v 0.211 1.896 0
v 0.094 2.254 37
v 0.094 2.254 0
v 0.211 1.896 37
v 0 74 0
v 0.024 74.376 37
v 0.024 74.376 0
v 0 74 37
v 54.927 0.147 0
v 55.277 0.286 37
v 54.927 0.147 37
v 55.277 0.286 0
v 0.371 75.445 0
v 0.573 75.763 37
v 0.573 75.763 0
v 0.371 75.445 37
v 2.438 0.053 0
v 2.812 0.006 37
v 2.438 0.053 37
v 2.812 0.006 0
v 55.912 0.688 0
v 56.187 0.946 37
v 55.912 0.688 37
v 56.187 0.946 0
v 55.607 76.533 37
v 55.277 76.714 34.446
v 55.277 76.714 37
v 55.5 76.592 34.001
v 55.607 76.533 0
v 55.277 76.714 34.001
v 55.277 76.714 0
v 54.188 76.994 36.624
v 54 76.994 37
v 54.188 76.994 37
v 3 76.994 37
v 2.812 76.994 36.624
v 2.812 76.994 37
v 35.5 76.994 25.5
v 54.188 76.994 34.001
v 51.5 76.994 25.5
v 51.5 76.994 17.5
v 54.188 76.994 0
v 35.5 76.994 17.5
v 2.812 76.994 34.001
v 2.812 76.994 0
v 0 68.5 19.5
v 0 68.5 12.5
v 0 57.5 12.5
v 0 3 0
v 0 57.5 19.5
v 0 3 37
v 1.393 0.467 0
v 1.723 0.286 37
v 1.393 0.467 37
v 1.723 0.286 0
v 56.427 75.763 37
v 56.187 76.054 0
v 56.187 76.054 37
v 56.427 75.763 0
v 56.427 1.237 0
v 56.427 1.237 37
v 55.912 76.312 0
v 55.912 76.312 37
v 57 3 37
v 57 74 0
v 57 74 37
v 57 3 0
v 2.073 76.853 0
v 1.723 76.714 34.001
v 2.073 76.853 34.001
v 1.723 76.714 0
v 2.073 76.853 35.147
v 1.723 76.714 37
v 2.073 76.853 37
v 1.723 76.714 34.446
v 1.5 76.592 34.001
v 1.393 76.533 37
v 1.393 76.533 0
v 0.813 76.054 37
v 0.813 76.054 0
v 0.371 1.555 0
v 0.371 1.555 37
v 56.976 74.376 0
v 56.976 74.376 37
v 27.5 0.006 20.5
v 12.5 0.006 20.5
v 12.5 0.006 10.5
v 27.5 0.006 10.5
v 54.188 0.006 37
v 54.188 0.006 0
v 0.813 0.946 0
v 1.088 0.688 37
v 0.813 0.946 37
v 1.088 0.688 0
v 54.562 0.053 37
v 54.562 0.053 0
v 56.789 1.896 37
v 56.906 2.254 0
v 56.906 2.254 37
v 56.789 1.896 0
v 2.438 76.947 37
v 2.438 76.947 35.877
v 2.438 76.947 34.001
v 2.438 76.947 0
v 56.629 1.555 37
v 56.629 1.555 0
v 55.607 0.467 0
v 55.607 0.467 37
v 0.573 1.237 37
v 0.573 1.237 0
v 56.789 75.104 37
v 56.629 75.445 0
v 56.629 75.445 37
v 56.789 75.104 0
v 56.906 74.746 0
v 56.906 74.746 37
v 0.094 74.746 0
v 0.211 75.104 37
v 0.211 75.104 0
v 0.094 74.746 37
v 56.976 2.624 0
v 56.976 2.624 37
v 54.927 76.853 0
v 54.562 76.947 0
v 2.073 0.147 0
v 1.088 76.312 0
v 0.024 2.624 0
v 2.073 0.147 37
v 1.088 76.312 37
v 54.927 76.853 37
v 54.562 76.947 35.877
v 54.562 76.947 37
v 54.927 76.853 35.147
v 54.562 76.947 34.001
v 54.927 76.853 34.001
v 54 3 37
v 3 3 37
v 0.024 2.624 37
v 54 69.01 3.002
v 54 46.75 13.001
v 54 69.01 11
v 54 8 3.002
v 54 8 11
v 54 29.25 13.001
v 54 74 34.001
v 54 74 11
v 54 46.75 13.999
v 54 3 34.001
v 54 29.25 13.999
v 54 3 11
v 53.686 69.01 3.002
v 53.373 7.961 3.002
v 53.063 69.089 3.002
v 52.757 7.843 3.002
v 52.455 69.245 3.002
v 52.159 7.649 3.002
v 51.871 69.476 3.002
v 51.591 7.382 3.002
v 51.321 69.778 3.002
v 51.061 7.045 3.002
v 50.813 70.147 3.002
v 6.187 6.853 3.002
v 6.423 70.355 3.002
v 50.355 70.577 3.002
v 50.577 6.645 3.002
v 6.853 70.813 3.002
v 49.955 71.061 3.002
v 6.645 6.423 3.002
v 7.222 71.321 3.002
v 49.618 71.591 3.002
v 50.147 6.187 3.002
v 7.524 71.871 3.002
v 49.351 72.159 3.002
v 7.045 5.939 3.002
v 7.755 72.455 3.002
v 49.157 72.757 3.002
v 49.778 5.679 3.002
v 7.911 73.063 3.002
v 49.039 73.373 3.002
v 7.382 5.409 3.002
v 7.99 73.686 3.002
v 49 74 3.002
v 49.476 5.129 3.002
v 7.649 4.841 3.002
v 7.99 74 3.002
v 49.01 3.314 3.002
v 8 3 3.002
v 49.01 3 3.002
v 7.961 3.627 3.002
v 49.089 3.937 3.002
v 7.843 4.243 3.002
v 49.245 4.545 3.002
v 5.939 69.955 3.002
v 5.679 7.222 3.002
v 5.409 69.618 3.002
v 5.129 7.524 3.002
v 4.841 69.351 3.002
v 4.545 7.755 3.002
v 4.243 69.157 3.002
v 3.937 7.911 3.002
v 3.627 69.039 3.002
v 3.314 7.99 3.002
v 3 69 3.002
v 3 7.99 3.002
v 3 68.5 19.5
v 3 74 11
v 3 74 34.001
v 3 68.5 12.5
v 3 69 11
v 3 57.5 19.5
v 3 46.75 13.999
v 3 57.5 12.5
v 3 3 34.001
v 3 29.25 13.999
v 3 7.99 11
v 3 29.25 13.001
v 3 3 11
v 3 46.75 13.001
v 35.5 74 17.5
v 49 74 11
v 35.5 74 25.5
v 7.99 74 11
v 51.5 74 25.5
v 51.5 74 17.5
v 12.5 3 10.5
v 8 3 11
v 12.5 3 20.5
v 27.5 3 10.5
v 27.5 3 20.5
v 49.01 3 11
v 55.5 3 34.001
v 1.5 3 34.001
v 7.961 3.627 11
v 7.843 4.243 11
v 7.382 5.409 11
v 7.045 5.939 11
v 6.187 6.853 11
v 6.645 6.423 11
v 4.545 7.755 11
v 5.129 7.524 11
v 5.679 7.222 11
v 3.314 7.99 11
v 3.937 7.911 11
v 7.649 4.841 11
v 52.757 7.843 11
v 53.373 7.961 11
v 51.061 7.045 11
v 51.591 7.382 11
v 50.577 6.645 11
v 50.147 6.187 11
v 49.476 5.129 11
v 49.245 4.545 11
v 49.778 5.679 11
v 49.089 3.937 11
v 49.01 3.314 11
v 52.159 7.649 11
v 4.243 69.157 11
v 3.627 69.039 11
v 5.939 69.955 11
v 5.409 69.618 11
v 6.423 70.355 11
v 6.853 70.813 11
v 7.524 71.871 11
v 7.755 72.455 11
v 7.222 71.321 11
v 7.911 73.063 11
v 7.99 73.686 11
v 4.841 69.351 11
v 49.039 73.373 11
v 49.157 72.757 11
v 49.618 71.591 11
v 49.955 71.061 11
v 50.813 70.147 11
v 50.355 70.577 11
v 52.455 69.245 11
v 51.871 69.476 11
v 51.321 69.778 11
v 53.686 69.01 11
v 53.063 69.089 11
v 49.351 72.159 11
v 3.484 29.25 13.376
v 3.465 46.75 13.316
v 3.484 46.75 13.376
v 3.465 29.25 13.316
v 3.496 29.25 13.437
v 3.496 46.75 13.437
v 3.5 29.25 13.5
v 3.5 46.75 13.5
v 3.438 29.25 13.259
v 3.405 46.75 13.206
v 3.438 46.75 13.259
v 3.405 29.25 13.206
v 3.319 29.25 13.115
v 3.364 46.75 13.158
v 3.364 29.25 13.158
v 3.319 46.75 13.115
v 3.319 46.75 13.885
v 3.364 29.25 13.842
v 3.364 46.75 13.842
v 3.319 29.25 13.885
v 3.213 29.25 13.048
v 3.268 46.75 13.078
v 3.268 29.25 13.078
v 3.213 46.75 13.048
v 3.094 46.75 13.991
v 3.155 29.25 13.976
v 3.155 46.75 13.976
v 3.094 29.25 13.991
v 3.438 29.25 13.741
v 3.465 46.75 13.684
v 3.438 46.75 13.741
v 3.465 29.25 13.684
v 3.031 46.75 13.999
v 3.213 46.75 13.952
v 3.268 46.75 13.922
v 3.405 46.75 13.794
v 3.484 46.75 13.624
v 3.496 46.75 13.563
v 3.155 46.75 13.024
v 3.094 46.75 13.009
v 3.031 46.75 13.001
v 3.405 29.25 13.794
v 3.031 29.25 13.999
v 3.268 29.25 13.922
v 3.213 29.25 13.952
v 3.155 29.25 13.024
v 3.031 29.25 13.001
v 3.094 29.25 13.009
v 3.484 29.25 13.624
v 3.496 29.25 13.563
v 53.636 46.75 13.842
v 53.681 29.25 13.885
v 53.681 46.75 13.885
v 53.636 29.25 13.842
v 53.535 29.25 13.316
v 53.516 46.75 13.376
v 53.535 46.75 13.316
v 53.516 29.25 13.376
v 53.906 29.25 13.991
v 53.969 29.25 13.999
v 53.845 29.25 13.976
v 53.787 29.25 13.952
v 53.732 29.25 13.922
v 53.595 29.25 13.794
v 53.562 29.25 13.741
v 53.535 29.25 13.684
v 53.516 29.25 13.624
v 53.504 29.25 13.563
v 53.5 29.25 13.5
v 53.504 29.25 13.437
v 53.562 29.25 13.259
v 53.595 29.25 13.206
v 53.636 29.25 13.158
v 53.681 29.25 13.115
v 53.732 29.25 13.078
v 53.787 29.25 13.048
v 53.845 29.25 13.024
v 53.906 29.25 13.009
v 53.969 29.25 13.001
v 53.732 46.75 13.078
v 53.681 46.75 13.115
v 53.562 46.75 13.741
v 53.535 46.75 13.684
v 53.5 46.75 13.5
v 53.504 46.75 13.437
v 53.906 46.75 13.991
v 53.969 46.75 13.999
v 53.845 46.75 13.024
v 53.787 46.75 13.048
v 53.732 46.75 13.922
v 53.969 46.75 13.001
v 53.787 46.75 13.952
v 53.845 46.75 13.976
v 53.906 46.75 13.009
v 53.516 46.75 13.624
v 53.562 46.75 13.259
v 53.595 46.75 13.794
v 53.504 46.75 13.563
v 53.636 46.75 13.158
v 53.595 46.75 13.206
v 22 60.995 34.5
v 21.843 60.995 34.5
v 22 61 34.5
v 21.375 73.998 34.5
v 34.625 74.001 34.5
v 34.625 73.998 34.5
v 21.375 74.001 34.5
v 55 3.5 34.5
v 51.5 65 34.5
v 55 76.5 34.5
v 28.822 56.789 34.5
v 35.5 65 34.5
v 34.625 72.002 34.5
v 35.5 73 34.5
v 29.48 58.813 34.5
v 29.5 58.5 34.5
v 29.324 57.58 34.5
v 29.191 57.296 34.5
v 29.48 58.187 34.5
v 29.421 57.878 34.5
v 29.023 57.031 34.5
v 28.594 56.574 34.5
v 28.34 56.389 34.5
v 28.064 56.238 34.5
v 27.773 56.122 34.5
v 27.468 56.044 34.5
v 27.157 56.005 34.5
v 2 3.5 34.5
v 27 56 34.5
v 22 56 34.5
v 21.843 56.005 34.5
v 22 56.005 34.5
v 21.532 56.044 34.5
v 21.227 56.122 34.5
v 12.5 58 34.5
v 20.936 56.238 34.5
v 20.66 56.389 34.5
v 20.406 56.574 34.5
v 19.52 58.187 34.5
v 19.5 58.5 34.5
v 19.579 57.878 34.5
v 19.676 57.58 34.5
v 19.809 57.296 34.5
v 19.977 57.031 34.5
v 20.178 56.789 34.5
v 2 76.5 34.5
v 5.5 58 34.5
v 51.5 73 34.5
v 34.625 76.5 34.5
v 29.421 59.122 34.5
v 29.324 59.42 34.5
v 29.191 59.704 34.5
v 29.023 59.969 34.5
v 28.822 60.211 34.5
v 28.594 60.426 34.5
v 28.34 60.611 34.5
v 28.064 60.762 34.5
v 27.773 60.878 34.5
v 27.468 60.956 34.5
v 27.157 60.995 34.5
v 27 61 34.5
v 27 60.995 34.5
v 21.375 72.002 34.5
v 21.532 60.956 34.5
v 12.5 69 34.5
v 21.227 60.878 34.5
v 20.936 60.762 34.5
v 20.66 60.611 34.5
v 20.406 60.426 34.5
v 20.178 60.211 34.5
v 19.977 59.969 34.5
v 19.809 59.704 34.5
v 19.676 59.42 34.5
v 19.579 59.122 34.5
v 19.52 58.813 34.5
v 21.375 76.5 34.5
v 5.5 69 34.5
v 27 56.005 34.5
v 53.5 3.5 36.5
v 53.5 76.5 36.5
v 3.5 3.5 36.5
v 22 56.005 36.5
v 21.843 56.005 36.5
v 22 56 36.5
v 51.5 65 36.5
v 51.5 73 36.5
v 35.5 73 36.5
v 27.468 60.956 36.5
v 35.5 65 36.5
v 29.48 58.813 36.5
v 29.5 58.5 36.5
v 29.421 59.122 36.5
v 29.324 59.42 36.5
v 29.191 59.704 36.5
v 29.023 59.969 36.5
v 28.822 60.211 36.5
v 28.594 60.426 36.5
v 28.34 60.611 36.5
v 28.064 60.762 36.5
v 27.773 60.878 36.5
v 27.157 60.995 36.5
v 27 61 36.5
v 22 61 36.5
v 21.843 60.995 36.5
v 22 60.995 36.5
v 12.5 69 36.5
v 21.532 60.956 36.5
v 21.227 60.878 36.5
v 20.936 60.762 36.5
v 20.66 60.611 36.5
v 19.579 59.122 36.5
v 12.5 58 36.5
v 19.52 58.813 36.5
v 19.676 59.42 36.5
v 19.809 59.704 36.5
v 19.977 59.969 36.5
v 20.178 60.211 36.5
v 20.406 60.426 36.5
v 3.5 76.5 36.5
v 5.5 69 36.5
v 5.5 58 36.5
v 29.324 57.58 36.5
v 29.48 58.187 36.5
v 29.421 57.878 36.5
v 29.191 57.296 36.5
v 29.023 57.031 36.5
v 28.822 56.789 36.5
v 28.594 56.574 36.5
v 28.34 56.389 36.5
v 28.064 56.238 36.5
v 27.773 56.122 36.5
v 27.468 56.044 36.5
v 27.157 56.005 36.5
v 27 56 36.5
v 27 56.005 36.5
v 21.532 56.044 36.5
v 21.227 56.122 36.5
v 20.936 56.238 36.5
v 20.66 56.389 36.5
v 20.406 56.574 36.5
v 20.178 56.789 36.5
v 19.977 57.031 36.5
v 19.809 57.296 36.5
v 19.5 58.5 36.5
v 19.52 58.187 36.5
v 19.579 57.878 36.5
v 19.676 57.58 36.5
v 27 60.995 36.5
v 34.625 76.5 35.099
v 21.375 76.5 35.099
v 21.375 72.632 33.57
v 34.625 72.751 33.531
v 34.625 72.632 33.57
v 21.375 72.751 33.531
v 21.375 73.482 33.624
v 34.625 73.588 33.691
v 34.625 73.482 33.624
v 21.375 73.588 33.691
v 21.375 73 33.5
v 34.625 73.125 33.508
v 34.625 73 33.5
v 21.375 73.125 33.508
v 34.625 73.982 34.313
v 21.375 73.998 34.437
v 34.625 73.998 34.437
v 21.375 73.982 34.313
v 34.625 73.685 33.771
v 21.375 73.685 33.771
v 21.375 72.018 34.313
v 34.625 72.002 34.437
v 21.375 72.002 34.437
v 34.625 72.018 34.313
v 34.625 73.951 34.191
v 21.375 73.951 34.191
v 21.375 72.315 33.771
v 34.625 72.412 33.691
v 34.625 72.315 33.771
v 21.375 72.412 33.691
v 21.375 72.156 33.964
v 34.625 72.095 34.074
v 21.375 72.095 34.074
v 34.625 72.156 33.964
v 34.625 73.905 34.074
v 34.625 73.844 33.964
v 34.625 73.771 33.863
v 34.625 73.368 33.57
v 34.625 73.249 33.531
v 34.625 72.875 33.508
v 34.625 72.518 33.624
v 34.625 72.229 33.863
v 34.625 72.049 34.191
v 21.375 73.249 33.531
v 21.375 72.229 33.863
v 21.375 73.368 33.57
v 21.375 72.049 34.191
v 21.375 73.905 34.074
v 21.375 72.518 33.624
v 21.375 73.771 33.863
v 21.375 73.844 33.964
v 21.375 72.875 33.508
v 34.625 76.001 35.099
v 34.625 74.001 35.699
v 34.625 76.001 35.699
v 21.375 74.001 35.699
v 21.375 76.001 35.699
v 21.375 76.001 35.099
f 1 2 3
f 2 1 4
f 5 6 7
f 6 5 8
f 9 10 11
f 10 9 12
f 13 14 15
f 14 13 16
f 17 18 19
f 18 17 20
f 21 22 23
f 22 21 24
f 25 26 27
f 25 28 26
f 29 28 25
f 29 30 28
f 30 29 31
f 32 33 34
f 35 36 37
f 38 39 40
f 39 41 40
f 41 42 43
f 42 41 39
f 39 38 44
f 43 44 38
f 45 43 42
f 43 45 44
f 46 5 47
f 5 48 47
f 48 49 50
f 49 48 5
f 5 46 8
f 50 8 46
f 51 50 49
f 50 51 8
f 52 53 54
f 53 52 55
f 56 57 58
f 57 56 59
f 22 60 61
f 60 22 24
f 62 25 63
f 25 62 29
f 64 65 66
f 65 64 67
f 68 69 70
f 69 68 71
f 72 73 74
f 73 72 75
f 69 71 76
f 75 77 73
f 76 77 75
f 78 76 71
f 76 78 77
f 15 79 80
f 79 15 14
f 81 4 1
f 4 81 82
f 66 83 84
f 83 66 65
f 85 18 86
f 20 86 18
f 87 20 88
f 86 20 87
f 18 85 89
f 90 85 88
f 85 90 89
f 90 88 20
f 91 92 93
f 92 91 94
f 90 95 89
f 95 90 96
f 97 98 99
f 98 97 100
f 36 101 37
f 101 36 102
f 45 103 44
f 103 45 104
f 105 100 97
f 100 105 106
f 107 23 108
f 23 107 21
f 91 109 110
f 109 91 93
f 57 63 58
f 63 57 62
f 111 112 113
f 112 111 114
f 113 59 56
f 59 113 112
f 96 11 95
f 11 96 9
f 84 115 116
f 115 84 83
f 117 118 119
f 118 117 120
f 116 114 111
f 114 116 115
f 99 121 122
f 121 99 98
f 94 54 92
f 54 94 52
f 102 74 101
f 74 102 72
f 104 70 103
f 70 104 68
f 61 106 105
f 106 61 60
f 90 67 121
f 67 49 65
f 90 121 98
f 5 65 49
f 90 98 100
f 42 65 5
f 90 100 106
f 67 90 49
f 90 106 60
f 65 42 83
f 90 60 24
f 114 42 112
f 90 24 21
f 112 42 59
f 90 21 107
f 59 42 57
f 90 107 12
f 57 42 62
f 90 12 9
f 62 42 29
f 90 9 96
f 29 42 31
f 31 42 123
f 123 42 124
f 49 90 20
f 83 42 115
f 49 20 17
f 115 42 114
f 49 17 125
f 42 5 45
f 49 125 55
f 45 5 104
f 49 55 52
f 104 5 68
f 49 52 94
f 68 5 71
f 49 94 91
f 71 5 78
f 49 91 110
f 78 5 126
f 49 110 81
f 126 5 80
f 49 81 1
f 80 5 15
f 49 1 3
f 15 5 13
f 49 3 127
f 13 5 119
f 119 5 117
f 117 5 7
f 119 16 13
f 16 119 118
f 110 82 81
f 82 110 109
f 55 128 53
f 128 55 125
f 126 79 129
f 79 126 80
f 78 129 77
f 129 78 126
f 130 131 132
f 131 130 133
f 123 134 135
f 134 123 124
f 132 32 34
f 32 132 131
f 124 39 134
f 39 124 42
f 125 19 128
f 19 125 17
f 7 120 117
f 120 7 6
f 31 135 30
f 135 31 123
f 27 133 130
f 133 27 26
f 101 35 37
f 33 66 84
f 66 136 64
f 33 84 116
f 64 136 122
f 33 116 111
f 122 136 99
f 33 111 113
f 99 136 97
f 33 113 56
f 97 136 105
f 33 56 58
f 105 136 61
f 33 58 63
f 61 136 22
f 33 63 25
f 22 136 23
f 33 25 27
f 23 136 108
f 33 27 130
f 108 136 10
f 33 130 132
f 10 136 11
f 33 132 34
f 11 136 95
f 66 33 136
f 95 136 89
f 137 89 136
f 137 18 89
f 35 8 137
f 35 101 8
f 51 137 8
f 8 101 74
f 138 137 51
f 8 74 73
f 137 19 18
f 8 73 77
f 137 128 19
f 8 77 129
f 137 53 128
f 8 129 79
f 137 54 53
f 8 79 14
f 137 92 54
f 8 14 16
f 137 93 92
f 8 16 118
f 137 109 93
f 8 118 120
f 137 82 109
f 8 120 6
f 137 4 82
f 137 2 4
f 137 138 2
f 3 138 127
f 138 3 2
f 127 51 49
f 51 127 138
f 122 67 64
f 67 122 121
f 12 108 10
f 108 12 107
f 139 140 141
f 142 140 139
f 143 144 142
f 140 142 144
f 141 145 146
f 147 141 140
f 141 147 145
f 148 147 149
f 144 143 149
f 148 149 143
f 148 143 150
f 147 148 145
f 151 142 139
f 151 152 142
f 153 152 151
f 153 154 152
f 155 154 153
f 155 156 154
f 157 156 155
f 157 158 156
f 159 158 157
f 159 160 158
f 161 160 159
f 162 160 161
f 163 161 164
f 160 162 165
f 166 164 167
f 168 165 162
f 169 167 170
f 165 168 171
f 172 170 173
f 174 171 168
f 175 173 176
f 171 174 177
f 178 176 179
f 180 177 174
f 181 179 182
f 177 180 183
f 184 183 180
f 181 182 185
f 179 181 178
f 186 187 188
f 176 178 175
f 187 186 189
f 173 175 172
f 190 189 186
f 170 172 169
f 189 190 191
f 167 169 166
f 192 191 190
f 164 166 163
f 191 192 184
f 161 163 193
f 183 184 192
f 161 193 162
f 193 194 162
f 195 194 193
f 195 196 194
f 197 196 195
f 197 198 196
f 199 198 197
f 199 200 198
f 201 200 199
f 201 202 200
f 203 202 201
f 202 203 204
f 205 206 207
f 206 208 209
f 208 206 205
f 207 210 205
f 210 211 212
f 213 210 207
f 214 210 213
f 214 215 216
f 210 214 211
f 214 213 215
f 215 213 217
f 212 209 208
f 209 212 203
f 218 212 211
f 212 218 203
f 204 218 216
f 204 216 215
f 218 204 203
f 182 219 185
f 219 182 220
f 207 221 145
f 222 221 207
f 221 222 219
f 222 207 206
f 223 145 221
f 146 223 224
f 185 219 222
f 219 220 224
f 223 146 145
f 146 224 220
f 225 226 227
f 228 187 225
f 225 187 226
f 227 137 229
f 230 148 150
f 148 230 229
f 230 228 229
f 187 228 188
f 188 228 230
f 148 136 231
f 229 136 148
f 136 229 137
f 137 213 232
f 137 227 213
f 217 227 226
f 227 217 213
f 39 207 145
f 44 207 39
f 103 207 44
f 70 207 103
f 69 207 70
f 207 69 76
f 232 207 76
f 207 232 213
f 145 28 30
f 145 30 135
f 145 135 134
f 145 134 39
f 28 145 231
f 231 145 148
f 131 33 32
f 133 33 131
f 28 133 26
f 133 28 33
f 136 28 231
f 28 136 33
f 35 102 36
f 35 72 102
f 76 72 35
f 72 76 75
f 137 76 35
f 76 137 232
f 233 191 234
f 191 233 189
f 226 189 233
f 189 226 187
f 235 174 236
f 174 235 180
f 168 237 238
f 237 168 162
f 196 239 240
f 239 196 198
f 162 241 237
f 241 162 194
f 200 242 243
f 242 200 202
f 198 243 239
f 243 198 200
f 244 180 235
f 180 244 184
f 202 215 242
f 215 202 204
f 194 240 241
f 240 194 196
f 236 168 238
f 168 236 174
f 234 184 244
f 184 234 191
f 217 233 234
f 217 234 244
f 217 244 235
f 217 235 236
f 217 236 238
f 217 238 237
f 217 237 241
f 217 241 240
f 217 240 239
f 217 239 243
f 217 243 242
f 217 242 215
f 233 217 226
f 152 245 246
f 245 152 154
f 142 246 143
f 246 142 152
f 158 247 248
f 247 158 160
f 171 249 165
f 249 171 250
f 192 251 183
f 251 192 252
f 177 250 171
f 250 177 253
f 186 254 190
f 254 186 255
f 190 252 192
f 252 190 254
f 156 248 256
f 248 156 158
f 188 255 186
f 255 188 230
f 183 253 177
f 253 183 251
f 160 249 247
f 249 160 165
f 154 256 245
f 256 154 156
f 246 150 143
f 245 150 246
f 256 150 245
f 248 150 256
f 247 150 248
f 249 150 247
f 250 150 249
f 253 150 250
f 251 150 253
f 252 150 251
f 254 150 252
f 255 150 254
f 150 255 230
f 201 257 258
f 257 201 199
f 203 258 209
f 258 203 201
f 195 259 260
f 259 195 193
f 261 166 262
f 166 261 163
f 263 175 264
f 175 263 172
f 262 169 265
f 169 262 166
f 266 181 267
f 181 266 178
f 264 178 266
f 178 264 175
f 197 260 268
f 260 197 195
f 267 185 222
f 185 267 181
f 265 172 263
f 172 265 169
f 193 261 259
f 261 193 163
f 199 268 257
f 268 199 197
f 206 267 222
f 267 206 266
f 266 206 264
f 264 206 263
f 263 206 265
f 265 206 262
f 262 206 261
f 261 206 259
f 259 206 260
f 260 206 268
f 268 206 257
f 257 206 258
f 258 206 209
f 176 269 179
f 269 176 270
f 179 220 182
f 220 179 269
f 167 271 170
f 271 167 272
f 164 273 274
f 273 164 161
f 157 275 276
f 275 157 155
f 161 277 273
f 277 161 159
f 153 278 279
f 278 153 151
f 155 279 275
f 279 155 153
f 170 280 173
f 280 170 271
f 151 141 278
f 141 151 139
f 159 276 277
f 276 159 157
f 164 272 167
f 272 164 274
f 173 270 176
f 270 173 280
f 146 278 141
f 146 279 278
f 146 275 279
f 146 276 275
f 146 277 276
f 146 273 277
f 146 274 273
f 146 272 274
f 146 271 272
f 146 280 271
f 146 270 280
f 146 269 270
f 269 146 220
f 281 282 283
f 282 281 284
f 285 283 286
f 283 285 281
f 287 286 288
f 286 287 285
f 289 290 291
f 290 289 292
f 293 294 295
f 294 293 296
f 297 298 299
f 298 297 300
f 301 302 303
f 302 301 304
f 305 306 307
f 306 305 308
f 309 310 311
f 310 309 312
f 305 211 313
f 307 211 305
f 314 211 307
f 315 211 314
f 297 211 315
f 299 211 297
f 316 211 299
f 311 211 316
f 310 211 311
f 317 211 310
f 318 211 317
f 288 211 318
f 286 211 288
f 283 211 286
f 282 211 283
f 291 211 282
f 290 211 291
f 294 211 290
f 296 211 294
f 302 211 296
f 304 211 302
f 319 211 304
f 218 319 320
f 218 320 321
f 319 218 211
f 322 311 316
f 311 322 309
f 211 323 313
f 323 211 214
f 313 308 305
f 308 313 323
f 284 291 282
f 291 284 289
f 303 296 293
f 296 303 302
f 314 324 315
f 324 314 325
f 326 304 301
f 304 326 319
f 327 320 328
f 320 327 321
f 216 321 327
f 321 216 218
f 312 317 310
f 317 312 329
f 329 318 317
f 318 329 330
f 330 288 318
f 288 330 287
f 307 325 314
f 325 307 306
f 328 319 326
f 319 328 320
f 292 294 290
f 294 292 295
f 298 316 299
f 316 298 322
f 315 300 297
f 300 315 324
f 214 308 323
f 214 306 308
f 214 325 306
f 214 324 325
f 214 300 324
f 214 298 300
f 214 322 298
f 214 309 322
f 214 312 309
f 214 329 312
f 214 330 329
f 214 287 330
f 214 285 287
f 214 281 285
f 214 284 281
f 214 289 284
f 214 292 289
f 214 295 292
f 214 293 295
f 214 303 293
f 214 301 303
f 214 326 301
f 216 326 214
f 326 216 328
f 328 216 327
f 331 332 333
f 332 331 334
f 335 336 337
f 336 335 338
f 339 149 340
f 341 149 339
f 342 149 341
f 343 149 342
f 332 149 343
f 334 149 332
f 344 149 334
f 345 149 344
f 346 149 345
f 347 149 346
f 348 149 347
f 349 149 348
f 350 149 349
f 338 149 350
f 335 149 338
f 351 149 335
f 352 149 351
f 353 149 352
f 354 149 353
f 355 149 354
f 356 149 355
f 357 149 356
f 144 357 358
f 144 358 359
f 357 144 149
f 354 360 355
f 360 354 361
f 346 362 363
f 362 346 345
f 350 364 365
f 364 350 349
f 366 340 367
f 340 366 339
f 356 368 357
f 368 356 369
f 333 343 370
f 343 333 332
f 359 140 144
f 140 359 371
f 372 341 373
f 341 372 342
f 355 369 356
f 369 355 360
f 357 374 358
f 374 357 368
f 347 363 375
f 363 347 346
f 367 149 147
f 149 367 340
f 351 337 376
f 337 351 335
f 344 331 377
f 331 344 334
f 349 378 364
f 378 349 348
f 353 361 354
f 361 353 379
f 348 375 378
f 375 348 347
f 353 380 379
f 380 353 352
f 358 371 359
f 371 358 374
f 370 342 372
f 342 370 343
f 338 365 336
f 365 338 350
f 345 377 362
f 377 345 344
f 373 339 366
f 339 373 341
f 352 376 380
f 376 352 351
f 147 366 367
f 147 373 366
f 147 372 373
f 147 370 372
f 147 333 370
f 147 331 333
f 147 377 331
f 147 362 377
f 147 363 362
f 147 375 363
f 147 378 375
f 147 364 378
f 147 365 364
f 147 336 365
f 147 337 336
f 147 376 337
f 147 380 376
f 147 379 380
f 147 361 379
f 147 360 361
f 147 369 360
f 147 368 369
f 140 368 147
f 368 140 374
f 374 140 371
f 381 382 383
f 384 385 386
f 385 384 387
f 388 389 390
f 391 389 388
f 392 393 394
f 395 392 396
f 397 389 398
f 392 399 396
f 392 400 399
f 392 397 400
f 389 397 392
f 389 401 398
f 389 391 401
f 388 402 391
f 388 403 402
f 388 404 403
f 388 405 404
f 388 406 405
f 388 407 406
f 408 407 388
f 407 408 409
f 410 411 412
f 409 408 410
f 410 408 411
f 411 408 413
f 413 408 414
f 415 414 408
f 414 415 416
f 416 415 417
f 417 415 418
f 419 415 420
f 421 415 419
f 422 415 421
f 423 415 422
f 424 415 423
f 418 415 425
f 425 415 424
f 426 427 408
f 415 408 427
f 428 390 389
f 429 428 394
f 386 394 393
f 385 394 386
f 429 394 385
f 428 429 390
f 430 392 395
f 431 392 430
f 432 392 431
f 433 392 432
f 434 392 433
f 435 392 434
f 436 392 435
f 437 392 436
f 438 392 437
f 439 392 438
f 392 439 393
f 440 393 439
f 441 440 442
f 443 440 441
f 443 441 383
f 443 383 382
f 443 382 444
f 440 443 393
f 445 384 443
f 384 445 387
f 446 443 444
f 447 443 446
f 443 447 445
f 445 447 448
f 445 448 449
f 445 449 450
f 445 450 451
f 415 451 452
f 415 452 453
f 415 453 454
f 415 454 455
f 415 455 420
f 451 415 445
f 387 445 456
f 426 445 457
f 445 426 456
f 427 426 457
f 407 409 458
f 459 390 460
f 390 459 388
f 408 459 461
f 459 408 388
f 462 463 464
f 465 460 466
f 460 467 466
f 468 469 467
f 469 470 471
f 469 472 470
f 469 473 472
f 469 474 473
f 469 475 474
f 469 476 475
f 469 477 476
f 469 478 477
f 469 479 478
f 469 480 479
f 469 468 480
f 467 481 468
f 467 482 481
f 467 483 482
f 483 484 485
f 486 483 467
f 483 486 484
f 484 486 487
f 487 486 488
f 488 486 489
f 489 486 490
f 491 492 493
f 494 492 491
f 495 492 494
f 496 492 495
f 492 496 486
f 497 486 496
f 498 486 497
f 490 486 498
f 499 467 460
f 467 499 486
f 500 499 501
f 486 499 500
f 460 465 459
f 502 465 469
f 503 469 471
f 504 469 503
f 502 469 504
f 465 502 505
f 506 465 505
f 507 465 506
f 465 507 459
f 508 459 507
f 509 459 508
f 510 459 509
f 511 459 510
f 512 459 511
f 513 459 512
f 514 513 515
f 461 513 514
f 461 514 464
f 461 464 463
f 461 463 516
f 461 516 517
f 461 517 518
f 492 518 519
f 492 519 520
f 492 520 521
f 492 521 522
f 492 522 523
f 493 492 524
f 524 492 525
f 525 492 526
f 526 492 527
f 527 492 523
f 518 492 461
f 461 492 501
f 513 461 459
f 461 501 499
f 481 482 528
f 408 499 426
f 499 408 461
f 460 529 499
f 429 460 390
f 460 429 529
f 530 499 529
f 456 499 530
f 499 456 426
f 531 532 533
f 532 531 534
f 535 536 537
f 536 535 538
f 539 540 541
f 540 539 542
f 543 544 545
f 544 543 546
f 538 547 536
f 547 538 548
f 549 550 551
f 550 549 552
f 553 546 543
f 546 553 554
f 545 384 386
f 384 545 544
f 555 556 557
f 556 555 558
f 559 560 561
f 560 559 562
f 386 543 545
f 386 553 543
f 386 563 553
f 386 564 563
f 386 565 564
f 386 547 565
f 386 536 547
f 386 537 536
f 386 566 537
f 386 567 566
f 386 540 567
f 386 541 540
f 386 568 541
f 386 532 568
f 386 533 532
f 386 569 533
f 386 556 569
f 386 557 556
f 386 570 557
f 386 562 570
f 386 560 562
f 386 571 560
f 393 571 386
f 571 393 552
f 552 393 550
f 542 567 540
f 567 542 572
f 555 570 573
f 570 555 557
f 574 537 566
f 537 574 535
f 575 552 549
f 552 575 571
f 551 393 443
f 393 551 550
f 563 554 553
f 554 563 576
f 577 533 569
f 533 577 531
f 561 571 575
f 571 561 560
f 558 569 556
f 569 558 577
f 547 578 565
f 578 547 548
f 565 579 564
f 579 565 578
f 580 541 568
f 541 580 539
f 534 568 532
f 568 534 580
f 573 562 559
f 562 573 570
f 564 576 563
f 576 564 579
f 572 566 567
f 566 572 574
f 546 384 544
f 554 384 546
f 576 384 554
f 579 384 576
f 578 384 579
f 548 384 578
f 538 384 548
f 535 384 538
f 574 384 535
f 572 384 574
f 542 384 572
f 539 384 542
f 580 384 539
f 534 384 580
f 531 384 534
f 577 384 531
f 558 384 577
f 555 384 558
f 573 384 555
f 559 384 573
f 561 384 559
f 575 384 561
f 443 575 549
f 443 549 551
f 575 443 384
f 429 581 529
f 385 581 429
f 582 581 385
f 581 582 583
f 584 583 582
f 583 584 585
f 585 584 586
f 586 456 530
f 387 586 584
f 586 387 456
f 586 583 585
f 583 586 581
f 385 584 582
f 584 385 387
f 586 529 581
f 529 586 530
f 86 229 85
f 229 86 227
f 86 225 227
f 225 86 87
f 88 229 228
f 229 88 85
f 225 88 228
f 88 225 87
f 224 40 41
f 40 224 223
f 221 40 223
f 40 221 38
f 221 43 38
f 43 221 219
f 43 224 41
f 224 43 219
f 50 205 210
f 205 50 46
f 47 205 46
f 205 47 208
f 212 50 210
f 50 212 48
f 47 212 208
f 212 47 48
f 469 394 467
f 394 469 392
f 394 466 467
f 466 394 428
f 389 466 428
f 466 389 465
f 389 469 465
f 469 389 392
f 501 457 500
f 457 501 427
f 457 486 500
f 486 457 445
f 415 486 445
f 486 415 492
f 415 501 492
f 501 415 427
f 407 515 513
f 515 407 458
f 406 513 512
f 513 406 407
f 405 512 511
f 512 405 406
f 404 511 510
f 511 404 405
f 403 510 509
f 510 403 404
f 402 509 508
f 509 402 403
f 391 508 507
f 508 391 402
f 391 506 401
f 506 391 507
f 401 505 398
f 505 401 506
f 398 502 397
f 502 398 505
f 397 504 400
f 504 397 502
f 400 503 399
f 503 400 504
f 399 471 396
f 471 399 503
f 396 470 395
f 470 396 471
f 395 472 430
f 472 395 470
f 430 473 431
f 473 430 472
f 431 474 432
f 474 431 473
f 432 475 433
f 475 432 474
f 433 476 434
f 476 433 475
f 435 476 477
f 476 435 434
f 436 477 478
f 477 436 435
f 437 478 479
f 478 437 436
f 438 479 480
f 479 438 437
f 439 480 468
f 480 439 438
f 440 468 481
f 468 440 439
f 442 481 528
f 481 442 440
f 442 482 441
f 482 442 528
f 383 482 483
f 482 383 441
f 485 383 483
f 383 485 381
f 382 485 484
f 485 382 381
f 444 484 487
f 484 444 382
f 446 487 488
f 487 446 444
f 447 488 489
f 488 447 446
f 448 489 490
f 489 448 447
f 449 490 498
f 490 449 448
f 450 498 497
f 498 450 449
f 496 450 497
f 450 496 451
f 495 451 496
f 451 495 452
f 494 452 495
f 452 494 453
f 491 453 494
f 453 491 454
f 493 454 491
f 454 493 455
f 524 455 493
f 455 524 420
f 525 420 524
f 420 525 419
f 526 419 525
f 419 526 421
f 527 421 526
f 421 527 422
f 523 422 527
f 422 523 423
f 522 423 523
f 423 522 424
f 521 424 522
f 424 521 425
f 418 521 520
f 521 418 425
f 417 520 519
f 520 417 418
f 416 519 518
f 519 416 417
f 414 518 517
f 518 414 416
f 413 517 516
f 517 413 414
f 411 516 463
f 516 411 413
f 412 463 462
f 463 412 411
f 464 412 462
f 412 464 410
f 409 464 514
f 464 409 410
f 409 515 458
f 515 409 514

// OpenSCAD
// file: project_box.scad
/* Project box

   A parametric box for electronics projects using perforated circuit boards. The
   board is held above the bottom of the box by four corner supports, and snaps
   into place to hold it snugly while allowing easy removal.

   Shapes provided as children will be used as cutouts, translated to the origin
   point of the top of the circuit board. Modules are provided for cutting out
   two-dimensional shapes from each wall face as well as the lid.
*/

$fn=50;

mode = "case";         // ["case", "lid", "all"]
board_x = 50;
board_y = 70;
board_thickness = 1;   // [1:10]
clearance_above = 20;  // [5:50]
clearance_below = 10;  // [5:50]
fit_tolerance = 0.5;
corner_radius=3;       // [1:10]
support_radius=5;      // [1:10]
wall_width=3;          // [3:10]

module _rounded_box(box, r) {
  hull() {
    translate([0 + r,0 + r,0])
      cylinder(h=box.z,r=r);
    translate([box.x - r,0 + r,0])
      cylinder(h=box.z, r=r);
    translate([box.x - r,box.y - r,0])
      cylinder(h=box.z, r=r);
    translate([0 + r,box.y - r,0])
      cylinder(h=box.z, r=r);
  }
}

module corner_post(h, r) {
  intersection() {
    translate([-0.001,-0.001,-0.001])
      cube([r*1.1, r*1.1, h*1.2]);
    cylinder(h=h, r=r);
  }
}

module lid_base(dimensions, slot_depth=1.5) {
  polyhedron([// bottom face
              [0, 0, 0],
              [dimensions.x, 0, 0],
              [dimensions.x, dimensions.y, 0],
              [0, dimensions.y, 0],
              // top face
              [slot_depth, 0, dimensions.z],
              [dimensions.x - slot_depth, 0, dimensions.z],
              [dimensions.x - slot_depth, dimensions.y, dimensions.z],
              [slot_depth, dimensions.y, dimensions.z]],
             [[0,1,2,3],
              [4,5,1,0],
              [7,6,5,4],
              [5,6,2,1],
              [6,7,3,2],
              [7,4,0,3]]);
}

module lid(dimensions, slot_depth=1.5, wall_width=3, fit_tolerance=0.5) {
  indent_width = dimensions.x / 4;
  difference() {
    union() {
      lid_base([dimensions.x, dimensions.y, dimensions.z], slot_depth);
      // locking tab
      translate([dimensions.x / 2 - indent_width / 2 - fit_tolerance,
                 dimensions.y - wall_width - fit_tolerance,
                 0])
        rotate([0, 90, 0])
        cylinder(h=dimensions.x / 4, r=2*fit_tolerance);
    }
    // pull handle
    translate([dimensions.x / 2 - indent_width / 2 - fit_tolerance,
               dimensions.y - wall_width + fit_tolerance + 0.001,
               -0.001]) {
      cube([indent_width,wall_width - 2 * fit_tolerance,0.6 * dimensions.z]);
      cube([indent_width,2 + wall_width - 2 * fit_tolerance,0.3 * dimensions.z]);
    }
  }
}

module project_box(box,
                   below=10,
                   board_thickness=1,
                   fit_tolerance=0.5,
                   corner_radius=3,
                   support_radius=5,
                   wall_width=3,
                   mode="case") {
  internal_width = box.x + (fit_tolerance * 2);  // tolerance on either side
  internal_depth = box.y + (fit_tolerance * 2);  // tolerance on either side

  internal_height = (fit_tolerance      // top tolerance
                     + box.z            // project height
                     + board_thickness  // board height
                     + below            // bottom clearance
                     + fit_tolerance);  // bottom tolerance

  lid_width = internal_width + wall_width;  // Extends halfway into each side wall
  lid_depth = internal_depth + wall_width;  // Extends out of one wall
  lid_height = wall_width;         // Replaces most of the top wall

  // case
  if ((mode == "case") || (mode == "all")) {
    difference() {
      union() {
        // hollow shell
        difference() {
          _rounded_box([internal_width + (wall_width * 2),
                        internal_depth + (wall_width * 2),
                        internal_height + (wall_width * 2)],
                       r=corner_radius);
          translate([wall_width,wall_width,wall_width + 0.002])
            cube([internal_width, internal_depth, internal_height]);
          // lid slot
          translate([wall_width / 2, wall_width, internal_height + wall_width + 0.001]) {
            lid_base([lid_width, lid_depth, lid_height]);
          }
        }
        // supports
        translate([wall_width,wall_width,wall_width]) {
          translate([0,0,0])
            corner_post(h=below, r=support_radius);
          translate([internal_width, 0, 0])
            rotate([0,0,90])
            corner_post(h=below, r=support_radius);
          translate([0,internal_depth, 0])
            rotate([0,0,270])
            corner_post(h=below, r=support_radius);
          translate([internal_width, internal_depth, 0])
            rotate([0,0,180])
            corner_post(h=below, r=support_radius);
        }

        // locking nubs
        translate([wall_width,wall_width,wall_width]) {
          nub_size = fit_tolerance * 2;
          nub_width = box.y / 4;
          nub_height = below + board_thickness + (nub_size/2) + (fit_tolerance*2);
          translate([0,box.y / 2 - nub_width / 2,nub_height])
            rotate([270,0,0])
            cylinder(h=nub_width, r=nub_size/2);
          translate([internal_width,box.y / 2 - nub_width / 2,nub_height])
            rotate([270,0,0])
            cylinder(h=nub_width, r=nub_size/2);
        }
        if (mode == "all") {
          // lid
          translate([wall_width / 2 + fit_tolerance,
                     wall_width + fit_tolerance,
                     internal_height + wall_width + fit_tolerance]) {
            lid([lid_width - (fit_tolerance * 2),
                 lid_depth - (fit_tolerance * 2),
                 lid_height - (fit_tolerance * 2)]);
          }
        }
      }
      // cutouts
      translate([wall_width + fit_tolerance,
                 wall_width + fit_tolerance,
                 fit_tolerance + wall_width + below + board_thickness])
        children();
    }
  } else if (mode == "lid") {
    // Flip the lid and translate it into place for printing
    translate([lid_width - (fit_tolerance * 2),0,lid_height - (fit_tolerance * 2)]) {
      rotate([0, 180, 0]) {
        difference() {
          translate([wall_width / 2 + fit_tolerance,
                     wall_width + fit_tolerance, 0]) {
            lid([lid_width - (fit_tolerance * 2),
                 lid_depth - (fit_tolerance * 2),
                 lid_height - (fit_tolerance * 2)]);
          }
          translate([wall_width + fit_tolerance,
                     wall_width + fit_tolerance,
                     below + board_thickness - internal_height]) {
            #children();
          }
        }
      }
    }
  }
}

module cutout_front(box, wall_width=3, fit_tolerance=0.5) {
  rotate([90, 0, 0])
    linear_extrude(height=wall_width + fit_tolerance + 0.001)
    children(0);
}

module cutout_back(box, wall_width=3, fit_tolerance=0.5)  {
  translate([box.x,box.y,0])
    rotate([90, 0, 180])
    linear_extrude(height=wall_width + fit_tolerance + .001)
    children(0);
}

module cutout_right(box, wall_width=3, fit_tolerance=0.5) {
  translate([box.x,0,0])
    rotate([90, 0, 90])
    linear_extrude(height=wall_width + fit_tolerance + 0.001)
    children(0);
}

module cutout_left(box, wall_width=3, fit_tolerance=0.5) {
  translate([0, box.y, 0])
    rotate([90, 0, 270])
    linear_extrude(height=wall_width + fit_tolerance + 0.001)
    children(0);
}

module cutout_top(box, wall_width=3, fit_tolerance=0.5) {
  translate([0, 0 - wall_width - fit_tolerance, box.z])
    linear_extrude(height=wall_width + fit_tolerance + 0.001)
    children(0);
}

project_box([board_x, board_y, clearance_above],
            below=clearance_below,
            board_thickness=board_thickness,
            fit_tolerance=fit_tolerance,
            corner_radius=corner_radius,
            support_radius=support_radius,
            wall_width=wall_width,
            mode=mode);
// main file
/* Garage Door Controller

   Holds a Wemos D1 Mini ESP8266 alongside a single relay board for controlling
   a garage door, a two-wire screw input for a reed switch, and two LEDs for
   power and status. All of this is mounted on a 5cmx7cm perforated circuit
   board.

   Project info: https://correl.phoenixinquis.net/2022/10/24/automating-our-garage-door-with-an-esp2866-and-home-assistant.html
 */

use <project_box.scad>
$fn=50;

mode = "all"; // ["case", "lid", "all"]

x = 50;
y = 70;
z = 21;
below = 8;

project_box([x, y, z],
            below=below,
            mode=mode) {
  // USB Port (Front)
  cutout_front([x,y,z])
    translate([9, -2, 0])
    square([15,10]);

  // Switch Control (Back)
  cutout_back([x,y,z])
    translate([2, 5, 0])
    square([16,8]);

  // Switch Sensor (Left)
  cutout_left([x,y,z])
    translate([5,0,0])
    square([11,7]);

  // Switch Control Screws (Top)
  cutout_top([x,y,z])
    translate([x - 18, y - 5,0])
    square([16, 8]);

  // Switch Sensor Screws (Top)
  cutout_top([x,y,z])
    translate([2, y - 12])
    square([7,11]);

  // LEDs (Top)
  cutout_top([x,y,z])
    translate([16, y - 14])
    union() {
      // 10x5 rounded rectangle
      translate([2.5, 2.5])
        circle(2.5);
      translate([2.5,0])
        square([5,5]);
      translate([7.5,2.5])
        circle(2.5);
    }
}
